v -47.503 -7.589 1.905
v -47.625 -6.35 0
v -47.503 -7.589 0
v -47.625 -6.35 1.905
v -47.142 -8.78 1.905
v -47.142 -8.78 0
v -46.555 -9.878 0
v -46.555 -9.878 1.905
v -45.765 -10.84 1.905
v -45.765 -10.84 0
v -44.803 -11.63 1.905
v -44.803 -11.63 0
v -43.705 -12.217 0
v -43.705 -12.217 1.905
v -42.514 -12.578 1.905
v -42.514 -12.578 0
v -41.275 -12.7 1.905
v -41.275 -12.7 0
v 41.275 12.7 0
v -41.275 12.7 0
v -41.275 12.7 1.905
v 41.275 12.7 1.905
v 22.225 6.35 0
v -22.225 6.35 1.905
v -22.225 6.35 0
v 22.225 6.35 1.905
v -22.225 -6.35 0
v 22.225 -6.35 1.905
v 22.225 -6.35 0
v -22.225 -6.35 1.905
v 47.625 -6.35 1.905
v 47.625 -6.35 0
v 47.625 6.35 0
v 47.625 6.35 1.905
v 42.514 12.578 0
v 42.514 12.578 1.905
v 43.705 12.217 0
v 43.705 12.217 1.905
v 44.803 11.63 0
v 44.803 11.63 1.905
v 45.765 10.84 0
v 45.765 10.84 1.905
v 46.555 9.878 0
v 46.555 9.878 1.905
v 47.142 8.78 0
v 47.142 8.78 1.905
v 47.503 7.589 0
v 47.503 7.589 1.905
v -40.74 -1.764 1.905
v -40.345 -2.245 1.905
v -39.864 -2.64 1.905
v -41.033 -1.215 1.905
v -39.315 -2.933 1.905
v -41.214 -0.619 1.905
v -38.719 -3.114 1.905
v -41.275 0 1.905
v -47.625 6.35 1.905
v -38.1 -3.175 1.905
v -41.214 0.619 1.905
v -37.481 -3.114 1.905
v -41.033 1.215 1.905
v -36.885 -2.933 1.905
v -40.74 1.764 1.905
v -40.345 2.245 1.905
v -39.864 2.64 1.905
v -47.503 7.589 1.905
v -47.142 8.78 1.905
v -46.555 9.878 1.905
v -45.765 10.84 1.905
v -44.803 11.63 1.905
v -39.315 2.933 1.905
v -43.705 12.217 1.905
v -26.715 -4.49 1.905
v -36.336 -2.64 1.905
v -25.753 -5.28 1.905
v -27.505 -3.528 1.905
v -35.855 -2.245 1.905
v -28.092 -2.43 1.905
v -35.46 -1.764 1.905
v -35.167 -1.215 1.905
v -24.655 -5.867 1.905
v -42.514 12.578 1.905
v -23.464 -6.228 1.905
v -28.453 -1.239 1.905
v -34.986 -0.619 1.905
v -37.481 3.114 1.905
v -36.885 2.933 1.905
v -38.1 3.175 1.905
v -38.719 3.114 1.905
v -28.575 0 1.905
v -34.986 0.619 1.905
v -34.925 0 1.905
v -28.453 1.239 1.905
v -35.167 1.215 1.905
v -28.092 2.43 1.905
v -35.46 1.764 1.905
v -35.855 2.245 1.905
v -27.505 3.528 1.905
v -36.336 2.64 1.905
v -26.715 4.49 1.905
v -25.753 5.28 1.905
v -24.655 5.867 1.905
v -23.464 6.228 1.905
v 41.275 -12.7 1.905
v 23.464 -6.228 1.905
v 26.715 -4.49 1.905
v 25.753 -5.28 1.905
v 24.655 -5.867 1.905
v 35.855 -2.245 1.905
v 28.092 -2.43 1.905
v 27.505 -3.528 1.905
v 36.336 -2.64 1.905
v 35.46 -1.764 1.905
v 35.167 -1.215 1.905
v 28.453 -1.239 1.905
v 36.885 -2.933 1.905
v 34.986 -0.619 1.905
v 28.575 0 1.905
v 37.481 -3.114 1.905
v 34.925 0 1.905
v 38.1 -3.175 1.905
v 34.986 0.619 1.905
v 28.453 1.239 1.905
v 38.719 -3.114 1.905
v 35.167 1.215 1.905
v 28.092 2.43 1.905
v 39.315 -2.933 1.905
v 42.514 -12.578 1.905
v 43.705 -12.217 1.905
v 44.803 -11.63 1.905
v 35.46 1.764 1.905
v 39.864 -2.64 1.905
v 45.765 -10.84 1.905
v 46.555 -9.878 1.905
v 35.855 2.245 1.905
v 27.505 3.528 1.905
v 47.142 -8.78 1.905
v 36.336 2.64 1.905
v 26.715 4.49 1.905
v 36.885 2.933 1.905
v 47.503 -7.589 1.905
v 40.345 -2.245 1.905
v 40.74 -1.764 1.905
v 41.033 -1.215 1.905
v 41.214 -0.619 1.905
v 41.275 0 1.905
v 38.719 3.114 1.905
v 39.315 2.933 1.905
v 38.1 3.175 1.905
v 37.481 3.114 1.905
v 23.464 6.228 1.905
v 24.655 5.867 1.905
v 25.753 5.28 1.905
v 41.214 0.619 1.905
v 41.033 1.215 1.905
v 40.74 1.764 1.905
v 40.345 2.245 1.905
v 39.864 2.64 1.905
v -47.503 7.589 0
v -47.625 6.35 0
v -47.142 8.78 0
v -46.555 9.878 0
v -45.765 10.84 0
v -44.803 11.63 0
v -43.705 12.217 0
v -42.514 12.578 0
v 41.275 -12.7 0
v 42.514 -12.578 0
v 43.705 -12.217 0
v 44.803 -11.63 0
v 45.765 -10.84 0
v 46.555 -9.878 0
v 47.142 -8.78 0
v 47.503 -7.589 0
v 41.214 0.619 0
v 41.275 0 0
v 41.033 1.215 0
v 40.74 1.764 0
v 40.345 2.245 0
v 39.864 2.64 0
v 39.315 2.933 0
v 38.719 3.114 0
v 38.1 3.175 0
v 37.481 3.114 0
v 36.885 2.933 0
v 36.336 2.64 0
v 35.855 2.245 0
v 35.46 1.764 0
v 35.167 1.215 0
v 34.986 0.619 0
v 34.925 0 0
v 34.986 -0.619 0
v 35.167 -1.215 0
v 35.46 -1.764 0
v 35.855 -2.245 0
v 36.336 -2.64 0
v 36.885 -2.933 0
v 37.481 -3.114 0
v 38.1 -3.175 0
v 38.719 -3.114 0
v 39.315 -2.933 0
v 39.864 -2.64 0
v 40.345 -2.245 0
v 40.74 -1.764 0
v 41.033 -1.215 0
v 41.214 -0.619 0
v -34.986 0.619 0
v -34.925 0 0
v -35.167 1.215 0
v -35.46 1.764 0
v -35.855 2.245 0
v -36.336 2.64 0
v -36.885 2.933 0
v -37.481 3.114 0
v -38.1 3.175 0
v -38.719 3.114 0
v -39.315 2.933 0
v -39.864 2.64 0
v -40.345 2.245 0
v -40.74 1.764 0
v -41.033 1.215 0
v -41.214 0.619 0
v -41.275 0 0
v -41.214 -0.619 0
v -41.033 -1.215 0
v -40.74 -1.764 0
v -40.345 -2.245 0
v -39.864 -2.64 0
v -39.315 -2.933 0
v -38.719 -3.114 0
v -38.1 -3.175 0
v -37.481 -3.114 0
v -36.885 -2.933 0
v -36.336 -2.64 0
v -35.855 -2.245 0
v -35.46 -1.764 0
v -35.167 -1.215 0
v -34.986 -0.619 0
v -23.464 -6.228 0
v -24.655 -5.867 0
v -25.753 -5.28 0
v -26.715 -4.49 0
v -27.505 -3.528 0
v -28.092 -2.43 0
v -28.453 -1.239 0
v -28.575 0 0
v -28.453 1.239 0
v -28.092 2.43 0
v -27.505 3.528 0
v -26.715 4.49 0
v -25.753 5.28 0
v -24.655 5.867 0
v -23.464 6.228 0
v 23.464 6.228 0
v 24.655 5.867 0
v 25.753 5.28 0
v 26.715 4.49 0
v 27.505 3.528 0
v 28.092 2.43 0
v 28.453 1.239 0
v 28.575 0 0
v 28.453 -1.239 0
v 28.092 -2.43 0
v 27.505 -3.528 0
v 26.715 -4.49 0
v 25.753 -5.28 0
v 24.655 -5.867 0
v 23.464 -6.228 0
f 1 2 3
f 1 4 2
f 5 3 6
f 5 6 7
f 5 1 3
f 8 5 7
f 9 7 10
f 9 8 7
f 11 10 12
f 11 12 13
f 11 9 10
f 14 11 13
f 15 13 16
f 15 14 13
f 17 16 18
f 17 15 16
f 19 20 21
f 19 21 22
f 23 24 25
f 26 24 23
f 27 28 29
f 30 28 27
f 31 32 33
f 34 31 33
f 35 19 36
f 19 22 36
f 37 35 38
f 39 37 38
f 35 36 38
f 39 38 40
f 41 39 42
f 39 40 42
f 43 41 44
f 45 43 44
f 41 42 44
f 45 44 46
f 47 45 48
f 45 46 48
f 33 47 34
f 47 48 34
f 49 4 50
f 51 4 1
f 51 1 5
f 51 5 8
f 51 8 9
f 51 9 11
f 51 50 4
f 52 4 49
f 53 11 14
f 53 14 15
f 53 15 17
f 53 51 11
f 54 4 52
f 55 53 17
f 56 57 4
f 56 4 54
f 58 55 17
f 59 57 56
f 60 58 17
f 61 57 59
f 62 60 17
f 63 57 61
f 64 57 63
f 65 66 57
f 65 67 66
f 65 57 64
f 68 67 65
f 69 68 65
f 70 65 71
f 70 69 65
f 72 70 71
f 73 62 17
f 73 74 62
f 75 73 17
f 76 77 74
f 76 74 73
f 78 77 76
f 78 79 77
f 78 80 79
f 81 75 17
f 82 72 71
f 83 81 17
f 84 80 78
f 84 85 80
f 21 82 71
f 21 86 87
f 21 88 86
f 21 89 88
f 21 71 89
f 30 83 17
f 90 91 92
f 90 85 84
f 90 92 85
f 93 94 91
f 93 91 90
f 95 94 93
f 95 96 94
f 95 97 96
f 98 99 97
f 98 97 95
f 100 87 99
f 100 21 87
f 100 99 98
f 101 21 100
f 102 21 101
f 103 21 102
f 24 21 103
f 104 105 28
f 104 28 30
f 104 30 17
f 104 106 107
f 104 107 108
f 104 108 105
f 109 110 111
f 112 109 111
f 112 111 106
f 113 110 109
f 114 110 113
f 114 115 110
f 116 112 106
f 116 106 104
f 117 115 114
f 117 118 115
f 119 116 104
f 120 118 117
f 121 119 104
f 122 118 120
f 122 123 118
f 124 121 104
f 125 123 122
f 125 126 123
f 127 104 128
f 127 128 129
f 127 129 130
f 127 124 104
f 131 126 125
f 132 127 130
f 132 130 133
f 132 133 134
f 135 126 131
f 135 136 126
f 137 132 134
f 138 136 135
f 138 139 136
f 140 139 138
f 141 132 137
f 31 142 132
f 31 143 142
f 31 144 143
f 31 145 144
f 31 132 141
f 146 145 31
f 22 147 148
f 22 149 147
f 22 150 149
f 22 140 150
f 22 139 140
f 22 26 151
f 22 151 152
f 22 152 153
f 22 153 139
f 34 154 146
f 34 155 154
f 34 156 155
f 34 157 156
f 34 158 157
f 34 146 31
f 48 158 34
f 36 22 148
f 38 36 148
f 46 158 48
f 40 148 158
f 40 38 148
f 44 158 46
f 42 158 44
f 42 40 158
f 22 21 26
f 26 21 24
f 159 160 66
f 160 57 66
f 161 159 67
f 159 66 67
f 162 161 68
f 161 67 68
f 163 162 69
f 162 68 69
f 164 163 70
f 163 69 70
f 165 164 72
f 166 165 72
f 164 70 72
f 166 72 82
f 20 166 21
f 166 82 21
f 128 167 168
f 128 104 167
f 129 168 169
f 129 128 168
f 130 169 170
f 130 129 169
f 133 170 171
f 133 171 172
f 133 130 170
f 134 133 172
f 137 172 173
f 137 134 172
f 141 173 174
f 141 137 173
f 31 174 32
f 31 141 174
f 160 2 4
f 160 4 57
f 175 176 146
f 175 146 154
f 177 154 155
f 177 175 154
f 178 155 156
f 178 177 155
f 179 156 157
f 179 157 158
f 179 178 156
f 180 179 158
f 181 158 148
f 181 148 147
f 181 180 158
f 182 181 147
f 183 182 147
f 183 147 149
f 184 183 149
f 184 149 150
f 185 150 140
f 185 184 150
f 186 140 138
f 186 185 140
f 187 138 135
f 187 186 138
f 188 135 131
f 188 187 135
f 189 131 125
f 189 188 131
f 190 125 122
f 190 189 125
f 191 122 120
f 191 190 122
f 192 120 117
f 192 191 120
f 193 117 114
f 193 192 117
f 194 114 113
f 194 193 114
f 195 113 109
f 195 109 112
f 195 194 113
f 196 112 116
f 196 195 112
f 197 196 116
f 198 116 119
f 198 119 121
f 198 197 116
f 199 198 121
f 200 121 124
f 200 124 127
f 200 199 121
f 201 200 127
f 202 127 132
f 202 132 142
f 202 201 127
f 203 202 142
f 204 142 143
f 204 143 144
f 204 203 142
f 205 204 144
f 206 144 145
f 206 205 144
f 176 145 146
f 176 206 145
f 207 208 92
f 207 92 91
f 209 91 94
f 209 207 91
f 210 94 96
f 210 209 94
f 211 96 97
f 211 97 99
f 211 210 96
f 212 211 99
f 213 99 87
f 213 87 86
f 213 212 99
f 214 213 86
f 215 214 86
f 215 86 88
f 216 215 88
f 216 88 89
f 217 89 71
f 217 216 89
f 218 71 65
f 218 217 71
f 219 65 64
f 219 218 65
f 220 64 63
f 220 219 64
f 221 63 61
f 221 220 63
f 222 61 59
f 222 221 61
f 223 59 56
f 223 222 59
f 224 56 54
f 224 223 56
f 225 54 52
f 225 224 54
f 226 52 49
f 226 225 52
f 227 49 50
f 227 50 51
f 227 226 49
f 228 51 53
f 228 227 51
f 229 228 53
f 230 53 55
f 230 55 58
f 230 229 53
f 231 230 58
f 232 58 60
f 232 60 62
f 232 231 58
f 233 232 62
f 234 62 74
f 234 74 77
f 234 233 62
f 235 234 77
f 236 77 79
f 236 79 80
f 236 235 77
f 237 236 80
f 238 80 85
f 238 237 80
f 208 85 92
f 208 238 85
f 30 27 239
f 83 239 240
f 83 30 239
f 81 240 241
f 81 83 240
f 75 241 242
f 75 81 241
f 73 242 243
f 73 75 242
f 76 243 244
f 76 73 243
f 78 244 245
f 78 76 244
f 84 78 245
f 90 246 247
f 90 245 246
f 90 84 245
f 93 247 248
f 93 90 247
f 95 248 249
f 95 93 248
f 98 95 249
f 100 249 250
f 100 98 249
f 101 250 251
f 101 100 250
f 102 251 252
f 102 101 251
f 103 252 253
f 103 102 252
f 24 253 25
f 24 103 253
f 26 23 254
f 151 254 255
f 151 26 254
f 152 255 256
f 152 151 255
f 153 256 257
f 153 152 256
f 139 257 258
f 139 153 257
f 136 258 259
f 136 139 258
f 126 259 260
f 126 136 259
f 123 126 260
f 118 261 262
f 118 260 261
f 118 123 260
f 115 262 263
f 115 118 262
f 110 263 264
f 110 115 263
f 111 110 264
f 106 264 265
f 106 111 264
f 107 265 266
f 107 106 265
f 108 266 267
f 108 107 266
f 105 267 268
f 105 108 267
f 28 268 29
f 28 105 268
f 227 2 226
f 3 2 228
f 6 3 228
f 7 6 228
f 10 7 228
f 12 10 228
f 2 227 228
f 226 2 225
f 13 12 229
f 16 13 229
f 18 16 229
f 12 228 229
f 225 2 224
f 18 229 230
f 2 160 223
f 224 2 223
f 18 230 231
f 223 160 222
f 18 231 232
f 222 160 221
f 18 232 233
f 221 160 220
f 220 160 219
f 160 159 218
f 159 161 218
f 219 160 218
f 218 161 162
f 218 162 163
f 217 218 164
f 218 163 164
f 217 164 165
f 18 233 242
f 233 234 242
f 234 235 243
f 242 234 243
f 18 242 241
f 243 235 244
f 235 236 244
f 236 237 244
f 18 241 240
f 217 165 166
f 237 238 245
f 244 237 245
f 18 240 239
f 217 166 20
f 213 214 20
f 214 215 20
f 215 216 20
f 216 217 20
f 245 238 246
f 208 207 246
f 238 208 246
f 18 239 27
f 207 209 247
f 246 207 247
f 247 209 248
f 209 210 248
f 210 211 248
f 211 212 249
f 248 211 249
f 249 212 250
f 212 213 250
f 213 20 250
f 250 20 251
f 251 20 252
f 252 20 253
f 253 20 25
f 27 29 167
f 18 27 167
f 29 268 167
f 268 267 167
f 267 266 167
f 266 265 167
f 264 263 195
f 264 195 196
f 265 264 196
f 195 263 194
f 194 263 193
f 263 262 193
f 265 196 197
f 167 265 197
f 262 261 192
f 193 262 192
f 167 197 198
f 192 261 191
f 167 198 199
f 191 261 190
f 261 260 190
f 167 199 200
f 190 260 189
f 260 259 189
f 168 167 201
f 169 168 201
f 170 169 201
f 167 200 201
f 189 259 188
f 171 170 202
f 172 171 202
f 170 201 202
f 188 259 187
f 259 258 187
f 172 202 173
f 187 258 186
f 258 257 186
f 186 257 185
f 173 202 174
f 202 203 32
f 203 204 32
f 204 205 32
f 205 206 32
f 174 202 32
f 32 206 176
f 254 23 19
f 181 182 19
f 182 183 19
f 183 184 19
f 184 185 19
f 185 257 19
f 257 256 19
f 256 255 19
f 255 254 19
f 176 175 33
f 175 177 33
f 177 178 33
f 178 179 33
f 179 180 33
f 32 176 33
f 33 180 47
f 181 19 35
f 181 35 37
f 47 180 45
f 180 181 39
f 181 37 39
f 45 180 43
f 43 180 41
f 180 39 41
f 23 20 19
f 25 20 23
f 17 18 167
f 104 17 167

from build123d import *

# Parameters (mm, degrees)
SKETCH1_W           = 95.25
SKETCH1_H           = 25.4
SKETCH1_R           = 3.175
BOSS_EXTRUDE1_DEPTH = 1.905
CUT_EXTRUDE1_DEPTH  = 2.905
FILLET1_R           = 6.35


with BuildPart() as part:
    # Sketch1 → Boss-Extrude1 (new body)
    with BuildSketch(Plane.XY):
        Rectangle(SKETCH1_W, SKETCH1_H)
        with Locations((-38.1, 0)):
            Circle(SKETCH1_R, mode=Mode.SUBTRACT)
        with Locations((38.1, 0)):
            Circle(SKETCH1_R, mode=Mode.SUBTRACT)
    extrude(amount=BOSS_EXTRUDE1_DEPTH)

    # Sketch2 → Cut-Extrude1 (cut, through all)
    with BuildSketch(Plane.XY.offset(1.905)):
        with BuildLine():
            Line((-22.225, 6.35), (22.225, 6.35))
            ThreePointArc((22.225, 6.35), (28.575, 0), (22.225, -6.35))
            Line((22.225, -6.35), (-22.225, -6.35))
            ThreePointArc((-22.225, -6.35), (-28.575, 0), (-22.225, 6.35))
        make_face()
    extrude(amount=-CUT_EXTRUDE1_DEPTH, mode=Mode.SUBTRACT)

    # Fillet1
    fillet1_edges = [part.edges().sort_by_distance(p)[0] for p in [
        (47.625, -12.7, 0.9525),
        (-47.625, -12.7, 0.9525),
        (-47.625, 12.7, 0.9525),
        (47.625, 12.7, 0.9525),
    ]]
    fillet(fillet1_edges, radius=FILLET1_R)


solid = part.part
